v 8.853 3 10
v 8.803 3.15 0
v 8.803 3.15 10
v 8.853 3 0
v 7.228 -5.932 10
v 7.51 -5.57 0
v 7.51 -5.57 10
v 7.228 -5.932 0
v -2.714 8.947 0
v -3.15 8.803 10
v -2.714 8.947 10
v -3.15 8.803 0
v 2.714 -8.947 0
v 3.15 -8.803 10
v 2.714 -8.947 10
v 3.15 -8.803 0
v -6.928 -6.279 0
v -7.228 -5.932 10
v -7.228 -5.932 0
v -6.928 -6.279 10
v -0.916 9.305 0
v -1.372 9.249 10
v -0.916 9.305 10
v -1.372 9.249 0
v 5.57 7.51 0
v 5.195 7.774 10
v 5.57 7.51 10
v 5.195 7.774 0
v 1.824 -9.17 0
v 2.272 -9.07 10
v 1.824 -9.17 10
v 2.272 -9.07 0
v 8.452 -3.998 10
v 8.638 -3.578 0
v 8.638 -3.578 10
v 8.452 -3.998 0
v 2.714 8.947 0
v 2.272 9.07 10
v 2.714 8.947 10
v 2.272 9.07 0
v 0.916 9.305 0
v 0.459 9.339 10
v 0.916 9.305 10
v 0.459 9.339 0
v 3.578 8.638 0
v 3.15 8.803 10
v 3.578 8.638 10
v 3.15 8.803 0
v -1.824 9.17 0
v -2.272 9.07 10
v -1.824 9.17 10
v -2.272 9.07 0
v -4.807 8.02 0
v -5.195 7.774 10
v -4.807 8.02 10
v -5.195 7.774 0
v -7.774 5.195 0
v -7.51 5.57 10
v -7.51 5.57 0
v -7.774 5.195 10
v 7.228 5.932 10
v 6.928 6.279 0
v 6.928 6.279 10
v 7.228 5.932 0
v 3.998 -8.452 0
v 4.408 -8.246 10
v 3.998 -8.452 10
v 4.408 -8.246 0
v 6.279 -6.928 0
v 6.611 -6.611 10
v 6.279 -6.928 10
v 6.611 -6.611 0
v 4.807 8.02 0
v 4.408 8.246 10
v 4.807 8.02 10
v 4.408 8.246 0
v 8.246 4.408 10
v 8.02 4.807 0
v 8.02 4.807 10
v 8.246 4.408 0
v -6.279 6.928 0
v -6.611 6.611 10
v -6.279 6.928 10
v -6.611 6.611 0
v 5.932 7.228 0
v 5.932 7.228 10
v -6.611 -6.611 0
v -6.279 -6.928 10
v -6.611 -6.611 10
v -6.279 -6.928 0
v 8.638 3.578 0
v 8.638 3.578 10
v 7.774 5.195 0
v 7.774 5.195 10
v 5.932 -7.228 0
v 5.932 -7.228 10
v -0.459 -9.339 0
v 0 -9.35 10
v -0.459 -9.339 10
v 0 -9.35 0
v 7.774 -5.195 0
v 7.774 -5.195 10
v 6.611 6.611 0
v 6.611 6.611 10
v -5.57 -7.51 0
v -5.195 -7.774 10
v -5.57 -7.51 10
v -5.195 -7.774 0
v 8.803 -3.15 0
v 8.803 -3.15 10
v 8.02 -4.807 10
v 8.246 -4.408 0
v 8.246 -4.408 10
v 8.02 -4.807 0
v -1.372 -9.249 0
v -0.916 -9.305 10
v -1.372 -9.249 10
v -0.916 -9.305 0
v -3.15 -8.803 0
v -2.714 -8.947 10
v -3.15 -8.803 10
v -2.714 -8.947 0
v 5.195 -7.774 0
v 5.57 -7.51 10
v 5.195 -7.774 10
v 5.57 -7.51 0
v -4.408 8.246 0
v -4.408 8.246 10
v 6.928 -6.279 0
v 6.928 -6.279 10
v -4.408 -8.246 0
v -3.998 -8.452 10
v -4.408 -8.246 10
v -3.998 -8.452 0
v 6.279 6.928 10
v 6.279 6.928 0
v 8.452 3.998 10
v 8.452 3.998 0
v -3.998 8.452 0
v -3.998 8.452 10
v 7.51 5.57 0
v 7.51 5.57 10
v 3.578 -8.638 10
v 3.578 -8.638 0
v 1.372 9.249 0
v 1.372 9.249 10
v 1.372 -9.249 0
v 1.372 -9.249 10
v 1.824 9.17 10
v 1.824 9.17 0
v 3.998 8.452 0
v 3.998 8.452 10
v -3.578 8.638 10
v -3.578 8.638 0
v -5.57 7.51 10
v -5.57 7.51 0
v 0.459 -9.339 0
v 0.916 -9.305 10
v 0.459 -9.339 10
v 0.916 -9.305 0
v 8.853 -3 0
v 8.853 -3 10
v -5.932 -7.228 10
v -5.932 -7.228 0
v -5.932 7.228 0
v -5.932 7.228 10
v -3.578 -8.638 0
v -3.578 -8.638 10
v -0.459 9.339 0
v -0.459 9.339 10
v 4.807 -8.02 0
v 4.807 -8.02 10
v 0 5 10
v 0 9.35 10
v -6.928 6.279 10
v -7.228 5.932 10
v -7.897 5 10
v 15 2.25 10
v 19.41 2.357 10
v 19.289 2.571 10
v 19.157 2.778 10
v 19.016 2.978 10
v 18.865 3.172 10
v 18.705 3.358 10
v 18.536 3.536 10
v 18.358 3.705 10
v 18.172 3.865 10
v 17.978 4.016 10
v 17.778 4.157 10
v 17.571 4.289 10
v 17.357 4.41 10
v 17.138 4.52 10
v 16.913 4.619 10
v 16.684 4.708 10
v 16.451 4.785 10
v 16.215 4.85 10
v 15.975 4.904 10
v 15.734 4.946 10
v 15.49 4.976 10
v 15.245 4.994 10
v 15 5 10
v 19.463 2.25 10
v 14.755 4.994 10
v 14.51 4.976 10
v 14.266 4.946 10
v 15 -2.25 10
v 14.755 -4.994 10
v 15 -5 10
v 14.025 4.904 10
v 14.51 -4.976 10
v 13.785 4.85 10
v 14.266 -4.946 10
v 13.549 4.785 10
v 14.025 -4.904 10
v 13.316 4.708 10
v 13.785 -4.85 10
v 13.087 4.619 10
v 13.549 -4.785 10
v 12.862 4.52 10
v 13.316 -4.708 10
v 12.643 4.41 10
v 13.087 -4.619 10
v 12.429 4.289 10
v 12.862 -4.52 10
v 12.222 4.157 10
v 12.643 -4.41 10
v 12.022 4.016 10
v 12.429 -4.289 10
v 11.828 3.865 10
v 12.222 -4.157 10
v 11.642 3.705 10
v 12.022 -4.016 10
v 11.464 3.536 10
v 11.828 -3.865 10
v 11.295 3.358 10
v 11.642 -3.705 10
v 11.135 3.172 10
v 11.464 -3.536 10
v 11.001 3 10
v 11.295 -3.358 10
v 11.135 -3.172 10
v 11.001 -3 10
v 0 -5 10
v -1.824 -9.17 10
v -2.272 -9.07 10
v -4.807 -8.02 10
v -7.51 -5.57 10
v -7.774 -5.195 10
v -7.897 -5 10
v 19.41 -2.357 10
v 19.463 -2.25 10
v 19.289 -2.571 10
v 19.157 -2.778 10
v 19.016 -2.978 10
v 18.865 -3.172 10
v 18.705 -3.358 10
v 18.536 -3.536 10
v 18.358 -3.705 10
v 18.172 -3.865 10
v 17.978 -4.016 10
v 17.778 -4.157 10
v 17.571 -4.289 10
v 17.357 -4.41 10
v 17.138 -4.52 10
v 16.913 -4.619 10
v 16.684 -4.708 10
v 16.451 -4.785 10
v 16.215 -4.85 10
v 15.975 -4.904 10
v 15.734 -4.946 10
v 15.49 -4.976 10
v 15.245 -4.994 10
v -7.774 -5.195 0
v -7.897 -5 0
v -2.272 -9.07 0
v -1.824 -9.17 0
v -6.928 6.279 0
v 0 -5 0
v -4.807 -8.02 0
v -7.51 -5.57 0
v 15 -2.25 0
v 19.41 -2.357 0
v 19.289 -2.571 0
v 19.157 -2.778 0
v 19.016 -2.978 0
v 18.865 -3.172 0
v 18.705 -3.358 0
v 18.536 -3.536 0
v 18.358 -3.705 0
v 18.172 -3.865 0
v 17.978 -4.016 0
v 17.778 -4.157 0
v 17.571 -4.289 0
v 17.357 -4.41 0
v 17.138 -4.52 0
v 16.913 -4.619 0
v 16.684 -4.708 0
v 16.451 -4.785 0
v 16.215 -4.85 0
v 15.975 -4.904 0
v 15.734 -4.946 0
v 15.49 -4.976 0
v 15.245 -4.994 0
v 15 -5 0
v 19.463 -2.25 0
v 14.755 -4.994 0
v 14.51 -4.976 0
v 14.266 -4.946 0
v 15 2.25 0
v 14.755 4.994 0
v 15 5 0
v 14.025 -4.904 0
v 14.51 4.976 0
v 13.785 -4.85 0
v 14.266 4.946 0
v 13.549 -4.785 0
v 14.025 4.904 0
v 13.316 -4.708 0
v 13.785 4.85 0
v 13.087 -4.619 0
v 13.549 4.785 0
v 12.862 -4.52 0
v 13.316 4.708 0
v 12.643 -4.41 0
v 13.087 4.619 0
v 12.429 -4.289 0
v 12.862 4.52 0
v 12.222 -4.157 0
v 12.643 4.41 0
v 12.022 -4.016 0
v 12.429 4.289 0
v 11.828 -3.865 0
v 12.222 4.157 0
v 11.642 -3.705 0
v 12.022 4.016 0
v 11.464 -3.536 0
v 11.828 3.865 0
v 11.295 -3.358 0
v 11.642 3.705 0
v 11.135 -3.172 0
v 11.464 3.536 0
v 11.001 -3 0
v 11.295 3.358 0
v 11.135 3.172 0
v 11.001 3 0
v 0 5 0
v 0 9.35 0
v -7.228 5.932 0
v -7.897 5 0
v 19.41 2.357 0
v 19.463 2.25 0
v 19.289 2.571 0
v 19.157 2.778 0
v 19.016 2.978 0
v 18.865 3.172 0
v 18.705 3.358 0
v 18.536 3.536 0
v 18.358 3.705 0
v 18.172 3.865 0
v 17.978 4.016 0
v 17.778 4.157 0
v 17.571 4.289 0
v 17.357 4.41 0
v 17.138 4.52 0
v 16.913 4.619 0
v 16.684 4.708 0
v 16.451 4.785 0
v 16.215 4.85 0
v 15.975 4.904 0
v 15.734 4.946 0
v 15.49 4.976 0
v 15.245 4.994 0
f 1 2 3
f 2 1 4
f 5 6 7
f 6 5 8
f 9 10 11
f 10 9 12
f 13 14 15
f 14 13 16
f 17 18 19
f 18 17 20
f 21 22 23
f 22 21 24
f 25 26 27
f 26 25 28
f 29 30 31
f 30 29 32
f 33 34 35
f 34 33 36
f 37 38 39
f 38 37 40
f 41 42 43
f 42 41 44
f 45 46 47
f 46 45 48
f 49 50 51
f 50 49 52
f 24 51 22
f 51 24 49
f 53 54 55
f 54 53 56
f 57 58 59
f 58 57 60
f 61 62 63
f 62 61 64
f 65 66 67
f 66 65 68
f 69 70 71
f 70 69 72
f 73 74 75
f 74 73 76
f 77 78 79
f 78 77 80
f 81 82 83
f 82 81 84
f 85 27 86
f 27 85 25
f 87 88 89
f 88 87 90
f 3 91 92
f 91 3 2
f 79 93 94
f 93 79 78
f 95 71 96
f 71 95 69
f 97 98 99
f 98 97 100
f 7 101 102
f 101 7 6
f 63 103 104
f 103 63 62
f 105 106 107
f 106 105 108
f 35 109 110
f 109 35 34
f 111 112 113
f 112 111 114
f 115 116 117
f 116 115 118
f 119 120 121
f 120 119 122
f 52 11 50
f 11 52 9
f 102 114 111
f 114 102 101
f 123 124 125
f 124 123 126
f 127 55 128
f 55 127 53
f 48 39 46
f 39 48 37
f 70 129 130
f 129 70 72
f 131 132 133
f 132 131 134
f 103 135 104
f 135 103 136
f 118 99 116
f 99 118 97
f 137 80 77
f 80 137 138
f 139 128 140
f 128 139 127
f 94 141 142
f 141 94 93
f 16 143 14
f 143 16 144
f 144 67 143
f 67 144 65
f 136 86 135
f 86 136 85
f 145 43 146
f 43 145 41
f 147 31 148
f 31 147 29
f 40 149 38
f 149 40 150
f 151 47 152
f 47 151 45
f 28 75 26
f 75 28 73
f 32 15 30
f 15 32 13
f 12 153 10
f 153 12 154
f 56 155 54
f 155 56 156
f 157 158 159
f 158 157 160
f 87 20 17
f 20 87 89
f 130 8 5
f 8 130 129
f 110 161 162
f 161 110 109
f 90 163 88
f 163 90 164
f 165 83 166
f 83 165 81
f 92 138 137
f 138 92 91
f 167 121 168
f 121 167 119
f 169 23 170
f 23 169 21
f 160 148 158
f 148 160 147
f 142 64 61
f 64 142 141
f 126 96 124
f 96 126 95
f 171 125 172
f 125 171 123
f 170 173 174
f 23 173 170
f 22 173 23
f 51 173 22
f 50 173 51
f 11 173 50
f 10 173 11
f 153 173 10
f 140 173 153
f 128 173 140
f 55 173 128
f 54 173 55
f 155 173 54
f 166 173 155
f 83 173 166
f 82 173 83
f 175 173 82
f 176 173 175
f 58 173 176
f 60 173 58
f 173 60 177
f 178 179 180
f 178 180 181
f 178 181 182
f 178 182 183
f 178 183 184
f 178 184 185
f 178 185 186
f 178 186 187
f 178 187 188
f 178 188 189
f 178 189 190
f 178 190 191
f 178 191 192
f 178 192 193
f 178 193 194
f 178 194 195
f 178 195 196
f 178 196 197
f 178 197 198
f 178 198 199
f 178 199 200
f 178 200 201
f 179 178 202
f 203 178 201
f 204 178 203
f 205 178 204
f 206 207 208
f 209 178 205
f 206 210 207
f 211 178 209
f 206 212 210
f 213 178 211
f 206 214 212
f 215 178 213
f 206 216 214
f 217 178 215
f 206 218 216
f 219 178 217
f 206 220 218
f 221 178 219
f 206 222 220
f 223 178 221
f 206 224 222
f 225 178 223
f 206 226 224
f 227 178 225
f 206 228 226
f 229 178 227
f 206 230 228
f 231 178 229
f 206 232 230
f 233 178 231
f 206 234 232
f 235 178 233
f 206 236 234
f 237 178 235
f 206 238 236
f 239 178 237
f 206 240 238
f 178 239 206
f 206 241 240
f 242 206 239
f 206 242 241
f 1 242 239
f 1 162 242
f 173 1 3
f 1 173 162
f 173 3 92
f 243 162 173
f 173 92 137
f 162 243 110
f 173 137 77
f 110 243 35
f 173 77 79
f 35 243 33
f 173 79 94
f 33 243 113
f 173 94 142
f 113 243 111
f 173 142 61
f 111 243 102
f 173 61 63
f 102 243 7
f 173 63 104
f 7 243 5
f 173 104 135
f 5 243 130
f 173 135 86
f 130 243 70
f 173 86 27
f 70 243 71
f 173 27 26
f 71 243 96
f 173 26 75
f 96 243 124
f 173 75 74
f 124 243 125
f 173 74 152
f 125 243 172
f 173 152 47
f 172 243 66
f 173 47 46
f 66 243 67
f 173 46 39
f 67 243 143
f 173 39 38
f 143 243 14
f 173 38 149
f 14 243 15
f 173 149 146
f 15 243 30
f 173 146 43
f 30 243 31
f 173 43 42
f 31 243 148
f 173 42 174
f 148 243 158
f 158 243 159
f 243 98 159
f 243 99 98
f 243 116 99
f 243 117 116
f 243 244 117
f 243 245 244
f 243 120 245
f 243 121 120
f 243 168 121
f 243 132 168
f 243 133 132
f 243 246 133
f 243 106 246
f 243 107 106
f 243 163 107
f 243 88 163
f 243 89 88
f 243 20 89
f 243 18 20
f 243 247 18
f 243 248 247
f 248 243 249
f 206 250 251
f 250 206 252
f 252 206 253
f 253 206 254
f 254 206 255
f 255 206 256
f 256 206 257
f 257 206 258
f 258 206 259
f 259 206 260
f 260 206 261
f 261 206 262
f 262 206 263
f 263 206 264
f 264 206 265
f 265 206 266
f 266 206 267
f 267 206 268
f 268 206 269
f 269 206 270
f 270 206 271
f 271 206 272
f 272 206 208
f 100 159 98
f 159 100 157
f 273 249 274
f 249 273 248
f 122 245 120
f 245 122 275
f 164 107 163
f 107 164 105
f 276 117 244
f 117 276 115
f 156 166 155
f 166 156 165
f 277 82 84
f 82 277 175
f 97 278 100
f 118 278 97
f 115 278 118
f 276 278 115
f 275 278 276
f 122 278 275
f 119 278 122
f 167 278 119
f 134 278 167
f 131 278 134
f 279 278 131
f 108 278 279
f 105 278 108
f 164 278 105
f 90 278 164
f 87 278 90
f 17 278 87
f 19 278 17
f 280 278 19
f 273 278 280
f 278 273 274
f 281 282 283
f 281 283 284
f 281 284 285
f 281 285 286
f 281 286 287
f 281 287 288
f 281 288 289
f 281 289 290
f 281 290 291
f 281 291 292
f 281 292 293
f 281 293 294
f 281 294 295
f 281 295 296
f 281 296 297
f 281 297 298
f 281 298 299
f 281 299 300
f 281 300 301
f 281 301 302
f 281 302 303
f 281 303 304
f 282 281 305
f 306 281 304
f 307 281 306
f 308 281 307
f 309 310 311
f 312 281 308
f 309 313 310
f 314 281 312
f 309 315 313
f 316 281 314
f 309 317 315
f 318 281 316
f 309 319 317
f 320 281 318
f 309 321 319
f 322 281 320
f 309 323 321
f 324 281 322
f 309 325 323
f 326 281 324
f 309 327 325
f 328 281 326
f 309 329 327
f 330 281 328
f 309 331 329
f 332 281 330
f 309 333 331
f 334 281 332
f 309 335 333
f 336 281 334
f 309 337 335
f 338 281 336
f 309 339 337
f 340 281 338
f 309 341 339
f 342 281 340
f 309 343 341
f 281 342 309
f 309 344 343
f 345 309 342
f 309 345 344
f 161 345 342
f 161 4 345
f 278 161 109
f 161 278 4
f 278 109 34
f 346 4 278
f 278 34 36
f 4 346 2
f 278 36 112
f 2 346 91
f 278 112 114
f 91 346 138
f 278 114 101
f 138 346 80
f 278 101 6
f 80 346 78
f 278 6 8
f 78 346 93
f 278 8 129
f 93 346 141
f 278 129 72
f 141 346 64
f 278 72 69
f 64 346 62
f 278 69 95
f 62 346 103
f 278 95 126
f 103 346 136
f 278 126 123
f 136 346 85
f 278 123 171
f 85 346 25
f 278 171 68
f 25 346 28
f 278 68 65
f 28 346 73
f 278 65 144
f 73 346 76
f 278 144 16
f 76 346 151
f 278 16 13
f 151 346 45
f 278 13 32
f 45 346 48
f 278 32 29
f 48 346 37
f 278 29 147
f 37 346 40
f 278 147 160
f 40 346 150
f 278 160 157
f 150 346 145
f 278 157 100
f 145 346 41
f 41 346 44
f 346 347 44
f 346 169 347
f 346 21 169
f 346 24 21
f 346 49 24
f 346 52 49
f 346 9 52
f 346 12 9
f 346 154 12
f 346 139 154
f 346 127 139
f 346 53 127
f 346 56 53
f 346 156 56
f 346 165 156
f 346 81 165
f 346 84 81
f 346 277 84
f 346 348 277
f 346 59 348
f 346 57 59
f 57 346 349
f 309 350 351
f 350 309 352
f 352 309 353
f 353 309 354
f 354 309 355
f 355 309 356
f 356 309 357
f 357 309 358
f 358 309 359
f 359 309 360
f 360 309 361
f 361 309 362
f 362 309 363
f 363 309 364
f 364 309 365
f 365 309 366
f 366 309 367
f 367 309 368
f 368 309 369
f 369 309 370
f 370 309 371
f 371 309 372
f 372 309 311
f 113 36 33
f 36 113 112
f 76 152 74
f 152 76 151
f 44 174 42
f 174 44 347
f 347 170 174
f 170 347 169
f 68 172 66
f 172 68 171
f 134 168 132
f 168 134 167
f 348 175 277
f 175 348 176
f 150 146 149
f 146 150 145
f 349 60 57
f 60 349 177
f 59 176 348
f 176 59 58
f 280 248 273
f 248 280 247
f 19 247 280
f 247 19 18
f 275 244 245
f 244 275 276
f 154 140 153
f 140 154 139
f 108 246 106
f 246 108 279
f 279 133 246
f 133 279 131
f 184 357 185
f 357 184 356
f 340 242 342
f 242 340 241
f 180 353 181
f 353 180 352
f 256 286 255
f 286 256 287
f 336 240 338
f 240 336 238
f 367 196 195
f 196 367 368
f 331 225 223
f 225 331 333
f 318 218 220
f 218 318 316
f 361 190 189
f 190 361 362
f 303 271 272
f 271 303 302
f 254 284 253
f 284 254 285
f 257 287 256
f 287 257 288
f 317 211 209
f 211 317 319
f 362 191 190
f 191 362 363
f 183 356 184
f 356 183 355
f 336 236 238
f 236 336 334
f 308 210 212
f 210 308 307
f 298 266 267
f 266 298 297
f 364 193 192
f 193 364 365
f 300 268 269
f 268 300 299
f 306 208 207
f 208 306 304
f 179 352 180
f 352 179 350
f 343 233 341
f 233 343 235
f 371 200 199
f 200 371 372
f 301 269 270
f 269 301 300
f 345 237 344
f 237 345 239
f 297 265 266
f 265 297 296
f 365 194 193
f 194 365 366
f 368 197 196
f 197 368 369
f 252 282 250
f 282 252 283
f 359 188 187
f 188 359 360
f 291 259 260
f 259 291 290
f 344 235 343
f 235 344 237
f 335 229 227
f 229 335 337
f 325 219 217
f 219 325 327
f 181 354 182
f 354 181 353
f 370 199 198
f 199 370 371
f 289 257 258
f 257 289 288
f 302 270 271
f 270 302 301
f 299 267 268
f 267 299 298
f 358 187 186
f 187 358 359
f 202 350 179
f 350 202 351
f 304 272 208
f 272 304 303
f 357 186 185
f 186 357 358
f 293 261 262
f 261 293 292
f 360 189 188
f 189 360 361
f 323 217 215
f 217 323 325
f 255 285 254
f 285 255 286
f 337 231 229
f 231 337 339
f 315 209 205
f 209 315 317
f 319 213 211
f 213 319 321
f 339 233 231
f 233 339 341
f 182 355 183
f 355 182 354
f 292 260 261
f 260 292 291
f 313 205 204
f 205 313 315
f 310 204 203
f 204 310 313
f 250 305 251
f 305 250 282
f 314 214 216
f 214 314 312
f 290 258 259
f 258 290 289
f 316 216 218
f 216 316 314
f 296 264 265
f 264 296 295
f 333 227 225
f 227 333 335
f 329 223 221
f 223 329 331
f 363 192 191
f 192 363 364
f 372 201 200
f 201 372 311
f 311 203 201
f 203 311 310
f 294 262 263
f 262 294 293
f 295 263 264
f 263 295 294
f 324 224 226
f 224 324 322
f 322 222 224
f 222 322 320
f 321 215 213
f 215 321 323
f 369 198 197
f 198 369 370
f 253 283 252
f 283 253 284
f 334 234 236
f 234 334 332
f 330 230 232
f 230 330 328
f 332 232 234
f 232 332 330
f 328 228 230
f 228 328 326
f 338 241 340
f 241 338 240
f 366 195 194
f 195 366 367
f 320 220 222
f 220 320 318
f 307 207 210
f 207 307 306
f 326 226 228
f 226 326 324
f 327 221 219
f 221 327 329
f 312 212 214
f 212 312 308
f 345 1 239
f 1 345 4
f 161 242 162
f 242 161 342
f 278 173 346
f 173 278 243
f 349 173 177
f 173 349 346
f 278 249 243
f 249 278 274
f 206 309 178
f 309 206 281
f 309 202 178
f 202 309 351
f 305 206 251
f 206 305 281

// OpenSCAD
// Snap-on clip: holds a piece of tubing next to a 12.7 mm lab stand rod
// Printed flat: 2-D profile in XY, extruded 10 mm in +Z

$fn = 128;

// ---- Dimensions (mm) ----
rod_d      = 12.7;              // rod ring inner diameter
rod_wall   = 3;                 // rod ring wall thickness
rod_od     = rod_d + 2*rod_wall; // rod ring outer diameter (18.7)

tub_d      = 6;                 // tubing ring inner diameter
tub_wall   = 2;                 // tubing ring wall thickness
tub_od     = tub_d + 2*tub_wall; // tubing ring outer diameter (10)

rod_gap    = 10;                // width of opening in rod ring on -X side (y from -5 to 5)
tub_gap    = 4.5;               // width of opening in tubing ring on +X side (y from -2.25 to 2.25)

bridge_w   = 6;                 // bridge width in Y
bridge_x0  = 8;                 // bridge start in X
bridge_x1  = 12;                // bridge end in X

clip_h     = 10;                // extrusion height (Z)

eps        = 0.5;               // overshoot for clean cuts

// ---- Model ----
difference() {
    union() {
        // Rod ring
        cylinder(d = rod_od, h = clip_h);
        // Tubing ring
        translate([15, 0, 0]) cylinder(d = tub_od, h = clip_h);
        // Solid bridge between the rings
        translate([bridge_x0, -bridge_w/2, 0])
            cube([bridge_x1 - bridge_x0, bridge_w, clip_h]);
    }

    // Opening in rod ring: x < 0, -5 < y < 5
    translate([-(rod_od/2 + eps), -rod_gap/2, -eps])
        cube([rod_od/2 + eps, rod_gap, clip_h + 2*eps]);

    // Opening in tubing ring: x > 15, -2.25 < y < 2.25
    translate([15, -tub_gap/2, -eps])
        cube([tub_od/2 + eps, tub_gap, clip_h + 2*eps]);
}
